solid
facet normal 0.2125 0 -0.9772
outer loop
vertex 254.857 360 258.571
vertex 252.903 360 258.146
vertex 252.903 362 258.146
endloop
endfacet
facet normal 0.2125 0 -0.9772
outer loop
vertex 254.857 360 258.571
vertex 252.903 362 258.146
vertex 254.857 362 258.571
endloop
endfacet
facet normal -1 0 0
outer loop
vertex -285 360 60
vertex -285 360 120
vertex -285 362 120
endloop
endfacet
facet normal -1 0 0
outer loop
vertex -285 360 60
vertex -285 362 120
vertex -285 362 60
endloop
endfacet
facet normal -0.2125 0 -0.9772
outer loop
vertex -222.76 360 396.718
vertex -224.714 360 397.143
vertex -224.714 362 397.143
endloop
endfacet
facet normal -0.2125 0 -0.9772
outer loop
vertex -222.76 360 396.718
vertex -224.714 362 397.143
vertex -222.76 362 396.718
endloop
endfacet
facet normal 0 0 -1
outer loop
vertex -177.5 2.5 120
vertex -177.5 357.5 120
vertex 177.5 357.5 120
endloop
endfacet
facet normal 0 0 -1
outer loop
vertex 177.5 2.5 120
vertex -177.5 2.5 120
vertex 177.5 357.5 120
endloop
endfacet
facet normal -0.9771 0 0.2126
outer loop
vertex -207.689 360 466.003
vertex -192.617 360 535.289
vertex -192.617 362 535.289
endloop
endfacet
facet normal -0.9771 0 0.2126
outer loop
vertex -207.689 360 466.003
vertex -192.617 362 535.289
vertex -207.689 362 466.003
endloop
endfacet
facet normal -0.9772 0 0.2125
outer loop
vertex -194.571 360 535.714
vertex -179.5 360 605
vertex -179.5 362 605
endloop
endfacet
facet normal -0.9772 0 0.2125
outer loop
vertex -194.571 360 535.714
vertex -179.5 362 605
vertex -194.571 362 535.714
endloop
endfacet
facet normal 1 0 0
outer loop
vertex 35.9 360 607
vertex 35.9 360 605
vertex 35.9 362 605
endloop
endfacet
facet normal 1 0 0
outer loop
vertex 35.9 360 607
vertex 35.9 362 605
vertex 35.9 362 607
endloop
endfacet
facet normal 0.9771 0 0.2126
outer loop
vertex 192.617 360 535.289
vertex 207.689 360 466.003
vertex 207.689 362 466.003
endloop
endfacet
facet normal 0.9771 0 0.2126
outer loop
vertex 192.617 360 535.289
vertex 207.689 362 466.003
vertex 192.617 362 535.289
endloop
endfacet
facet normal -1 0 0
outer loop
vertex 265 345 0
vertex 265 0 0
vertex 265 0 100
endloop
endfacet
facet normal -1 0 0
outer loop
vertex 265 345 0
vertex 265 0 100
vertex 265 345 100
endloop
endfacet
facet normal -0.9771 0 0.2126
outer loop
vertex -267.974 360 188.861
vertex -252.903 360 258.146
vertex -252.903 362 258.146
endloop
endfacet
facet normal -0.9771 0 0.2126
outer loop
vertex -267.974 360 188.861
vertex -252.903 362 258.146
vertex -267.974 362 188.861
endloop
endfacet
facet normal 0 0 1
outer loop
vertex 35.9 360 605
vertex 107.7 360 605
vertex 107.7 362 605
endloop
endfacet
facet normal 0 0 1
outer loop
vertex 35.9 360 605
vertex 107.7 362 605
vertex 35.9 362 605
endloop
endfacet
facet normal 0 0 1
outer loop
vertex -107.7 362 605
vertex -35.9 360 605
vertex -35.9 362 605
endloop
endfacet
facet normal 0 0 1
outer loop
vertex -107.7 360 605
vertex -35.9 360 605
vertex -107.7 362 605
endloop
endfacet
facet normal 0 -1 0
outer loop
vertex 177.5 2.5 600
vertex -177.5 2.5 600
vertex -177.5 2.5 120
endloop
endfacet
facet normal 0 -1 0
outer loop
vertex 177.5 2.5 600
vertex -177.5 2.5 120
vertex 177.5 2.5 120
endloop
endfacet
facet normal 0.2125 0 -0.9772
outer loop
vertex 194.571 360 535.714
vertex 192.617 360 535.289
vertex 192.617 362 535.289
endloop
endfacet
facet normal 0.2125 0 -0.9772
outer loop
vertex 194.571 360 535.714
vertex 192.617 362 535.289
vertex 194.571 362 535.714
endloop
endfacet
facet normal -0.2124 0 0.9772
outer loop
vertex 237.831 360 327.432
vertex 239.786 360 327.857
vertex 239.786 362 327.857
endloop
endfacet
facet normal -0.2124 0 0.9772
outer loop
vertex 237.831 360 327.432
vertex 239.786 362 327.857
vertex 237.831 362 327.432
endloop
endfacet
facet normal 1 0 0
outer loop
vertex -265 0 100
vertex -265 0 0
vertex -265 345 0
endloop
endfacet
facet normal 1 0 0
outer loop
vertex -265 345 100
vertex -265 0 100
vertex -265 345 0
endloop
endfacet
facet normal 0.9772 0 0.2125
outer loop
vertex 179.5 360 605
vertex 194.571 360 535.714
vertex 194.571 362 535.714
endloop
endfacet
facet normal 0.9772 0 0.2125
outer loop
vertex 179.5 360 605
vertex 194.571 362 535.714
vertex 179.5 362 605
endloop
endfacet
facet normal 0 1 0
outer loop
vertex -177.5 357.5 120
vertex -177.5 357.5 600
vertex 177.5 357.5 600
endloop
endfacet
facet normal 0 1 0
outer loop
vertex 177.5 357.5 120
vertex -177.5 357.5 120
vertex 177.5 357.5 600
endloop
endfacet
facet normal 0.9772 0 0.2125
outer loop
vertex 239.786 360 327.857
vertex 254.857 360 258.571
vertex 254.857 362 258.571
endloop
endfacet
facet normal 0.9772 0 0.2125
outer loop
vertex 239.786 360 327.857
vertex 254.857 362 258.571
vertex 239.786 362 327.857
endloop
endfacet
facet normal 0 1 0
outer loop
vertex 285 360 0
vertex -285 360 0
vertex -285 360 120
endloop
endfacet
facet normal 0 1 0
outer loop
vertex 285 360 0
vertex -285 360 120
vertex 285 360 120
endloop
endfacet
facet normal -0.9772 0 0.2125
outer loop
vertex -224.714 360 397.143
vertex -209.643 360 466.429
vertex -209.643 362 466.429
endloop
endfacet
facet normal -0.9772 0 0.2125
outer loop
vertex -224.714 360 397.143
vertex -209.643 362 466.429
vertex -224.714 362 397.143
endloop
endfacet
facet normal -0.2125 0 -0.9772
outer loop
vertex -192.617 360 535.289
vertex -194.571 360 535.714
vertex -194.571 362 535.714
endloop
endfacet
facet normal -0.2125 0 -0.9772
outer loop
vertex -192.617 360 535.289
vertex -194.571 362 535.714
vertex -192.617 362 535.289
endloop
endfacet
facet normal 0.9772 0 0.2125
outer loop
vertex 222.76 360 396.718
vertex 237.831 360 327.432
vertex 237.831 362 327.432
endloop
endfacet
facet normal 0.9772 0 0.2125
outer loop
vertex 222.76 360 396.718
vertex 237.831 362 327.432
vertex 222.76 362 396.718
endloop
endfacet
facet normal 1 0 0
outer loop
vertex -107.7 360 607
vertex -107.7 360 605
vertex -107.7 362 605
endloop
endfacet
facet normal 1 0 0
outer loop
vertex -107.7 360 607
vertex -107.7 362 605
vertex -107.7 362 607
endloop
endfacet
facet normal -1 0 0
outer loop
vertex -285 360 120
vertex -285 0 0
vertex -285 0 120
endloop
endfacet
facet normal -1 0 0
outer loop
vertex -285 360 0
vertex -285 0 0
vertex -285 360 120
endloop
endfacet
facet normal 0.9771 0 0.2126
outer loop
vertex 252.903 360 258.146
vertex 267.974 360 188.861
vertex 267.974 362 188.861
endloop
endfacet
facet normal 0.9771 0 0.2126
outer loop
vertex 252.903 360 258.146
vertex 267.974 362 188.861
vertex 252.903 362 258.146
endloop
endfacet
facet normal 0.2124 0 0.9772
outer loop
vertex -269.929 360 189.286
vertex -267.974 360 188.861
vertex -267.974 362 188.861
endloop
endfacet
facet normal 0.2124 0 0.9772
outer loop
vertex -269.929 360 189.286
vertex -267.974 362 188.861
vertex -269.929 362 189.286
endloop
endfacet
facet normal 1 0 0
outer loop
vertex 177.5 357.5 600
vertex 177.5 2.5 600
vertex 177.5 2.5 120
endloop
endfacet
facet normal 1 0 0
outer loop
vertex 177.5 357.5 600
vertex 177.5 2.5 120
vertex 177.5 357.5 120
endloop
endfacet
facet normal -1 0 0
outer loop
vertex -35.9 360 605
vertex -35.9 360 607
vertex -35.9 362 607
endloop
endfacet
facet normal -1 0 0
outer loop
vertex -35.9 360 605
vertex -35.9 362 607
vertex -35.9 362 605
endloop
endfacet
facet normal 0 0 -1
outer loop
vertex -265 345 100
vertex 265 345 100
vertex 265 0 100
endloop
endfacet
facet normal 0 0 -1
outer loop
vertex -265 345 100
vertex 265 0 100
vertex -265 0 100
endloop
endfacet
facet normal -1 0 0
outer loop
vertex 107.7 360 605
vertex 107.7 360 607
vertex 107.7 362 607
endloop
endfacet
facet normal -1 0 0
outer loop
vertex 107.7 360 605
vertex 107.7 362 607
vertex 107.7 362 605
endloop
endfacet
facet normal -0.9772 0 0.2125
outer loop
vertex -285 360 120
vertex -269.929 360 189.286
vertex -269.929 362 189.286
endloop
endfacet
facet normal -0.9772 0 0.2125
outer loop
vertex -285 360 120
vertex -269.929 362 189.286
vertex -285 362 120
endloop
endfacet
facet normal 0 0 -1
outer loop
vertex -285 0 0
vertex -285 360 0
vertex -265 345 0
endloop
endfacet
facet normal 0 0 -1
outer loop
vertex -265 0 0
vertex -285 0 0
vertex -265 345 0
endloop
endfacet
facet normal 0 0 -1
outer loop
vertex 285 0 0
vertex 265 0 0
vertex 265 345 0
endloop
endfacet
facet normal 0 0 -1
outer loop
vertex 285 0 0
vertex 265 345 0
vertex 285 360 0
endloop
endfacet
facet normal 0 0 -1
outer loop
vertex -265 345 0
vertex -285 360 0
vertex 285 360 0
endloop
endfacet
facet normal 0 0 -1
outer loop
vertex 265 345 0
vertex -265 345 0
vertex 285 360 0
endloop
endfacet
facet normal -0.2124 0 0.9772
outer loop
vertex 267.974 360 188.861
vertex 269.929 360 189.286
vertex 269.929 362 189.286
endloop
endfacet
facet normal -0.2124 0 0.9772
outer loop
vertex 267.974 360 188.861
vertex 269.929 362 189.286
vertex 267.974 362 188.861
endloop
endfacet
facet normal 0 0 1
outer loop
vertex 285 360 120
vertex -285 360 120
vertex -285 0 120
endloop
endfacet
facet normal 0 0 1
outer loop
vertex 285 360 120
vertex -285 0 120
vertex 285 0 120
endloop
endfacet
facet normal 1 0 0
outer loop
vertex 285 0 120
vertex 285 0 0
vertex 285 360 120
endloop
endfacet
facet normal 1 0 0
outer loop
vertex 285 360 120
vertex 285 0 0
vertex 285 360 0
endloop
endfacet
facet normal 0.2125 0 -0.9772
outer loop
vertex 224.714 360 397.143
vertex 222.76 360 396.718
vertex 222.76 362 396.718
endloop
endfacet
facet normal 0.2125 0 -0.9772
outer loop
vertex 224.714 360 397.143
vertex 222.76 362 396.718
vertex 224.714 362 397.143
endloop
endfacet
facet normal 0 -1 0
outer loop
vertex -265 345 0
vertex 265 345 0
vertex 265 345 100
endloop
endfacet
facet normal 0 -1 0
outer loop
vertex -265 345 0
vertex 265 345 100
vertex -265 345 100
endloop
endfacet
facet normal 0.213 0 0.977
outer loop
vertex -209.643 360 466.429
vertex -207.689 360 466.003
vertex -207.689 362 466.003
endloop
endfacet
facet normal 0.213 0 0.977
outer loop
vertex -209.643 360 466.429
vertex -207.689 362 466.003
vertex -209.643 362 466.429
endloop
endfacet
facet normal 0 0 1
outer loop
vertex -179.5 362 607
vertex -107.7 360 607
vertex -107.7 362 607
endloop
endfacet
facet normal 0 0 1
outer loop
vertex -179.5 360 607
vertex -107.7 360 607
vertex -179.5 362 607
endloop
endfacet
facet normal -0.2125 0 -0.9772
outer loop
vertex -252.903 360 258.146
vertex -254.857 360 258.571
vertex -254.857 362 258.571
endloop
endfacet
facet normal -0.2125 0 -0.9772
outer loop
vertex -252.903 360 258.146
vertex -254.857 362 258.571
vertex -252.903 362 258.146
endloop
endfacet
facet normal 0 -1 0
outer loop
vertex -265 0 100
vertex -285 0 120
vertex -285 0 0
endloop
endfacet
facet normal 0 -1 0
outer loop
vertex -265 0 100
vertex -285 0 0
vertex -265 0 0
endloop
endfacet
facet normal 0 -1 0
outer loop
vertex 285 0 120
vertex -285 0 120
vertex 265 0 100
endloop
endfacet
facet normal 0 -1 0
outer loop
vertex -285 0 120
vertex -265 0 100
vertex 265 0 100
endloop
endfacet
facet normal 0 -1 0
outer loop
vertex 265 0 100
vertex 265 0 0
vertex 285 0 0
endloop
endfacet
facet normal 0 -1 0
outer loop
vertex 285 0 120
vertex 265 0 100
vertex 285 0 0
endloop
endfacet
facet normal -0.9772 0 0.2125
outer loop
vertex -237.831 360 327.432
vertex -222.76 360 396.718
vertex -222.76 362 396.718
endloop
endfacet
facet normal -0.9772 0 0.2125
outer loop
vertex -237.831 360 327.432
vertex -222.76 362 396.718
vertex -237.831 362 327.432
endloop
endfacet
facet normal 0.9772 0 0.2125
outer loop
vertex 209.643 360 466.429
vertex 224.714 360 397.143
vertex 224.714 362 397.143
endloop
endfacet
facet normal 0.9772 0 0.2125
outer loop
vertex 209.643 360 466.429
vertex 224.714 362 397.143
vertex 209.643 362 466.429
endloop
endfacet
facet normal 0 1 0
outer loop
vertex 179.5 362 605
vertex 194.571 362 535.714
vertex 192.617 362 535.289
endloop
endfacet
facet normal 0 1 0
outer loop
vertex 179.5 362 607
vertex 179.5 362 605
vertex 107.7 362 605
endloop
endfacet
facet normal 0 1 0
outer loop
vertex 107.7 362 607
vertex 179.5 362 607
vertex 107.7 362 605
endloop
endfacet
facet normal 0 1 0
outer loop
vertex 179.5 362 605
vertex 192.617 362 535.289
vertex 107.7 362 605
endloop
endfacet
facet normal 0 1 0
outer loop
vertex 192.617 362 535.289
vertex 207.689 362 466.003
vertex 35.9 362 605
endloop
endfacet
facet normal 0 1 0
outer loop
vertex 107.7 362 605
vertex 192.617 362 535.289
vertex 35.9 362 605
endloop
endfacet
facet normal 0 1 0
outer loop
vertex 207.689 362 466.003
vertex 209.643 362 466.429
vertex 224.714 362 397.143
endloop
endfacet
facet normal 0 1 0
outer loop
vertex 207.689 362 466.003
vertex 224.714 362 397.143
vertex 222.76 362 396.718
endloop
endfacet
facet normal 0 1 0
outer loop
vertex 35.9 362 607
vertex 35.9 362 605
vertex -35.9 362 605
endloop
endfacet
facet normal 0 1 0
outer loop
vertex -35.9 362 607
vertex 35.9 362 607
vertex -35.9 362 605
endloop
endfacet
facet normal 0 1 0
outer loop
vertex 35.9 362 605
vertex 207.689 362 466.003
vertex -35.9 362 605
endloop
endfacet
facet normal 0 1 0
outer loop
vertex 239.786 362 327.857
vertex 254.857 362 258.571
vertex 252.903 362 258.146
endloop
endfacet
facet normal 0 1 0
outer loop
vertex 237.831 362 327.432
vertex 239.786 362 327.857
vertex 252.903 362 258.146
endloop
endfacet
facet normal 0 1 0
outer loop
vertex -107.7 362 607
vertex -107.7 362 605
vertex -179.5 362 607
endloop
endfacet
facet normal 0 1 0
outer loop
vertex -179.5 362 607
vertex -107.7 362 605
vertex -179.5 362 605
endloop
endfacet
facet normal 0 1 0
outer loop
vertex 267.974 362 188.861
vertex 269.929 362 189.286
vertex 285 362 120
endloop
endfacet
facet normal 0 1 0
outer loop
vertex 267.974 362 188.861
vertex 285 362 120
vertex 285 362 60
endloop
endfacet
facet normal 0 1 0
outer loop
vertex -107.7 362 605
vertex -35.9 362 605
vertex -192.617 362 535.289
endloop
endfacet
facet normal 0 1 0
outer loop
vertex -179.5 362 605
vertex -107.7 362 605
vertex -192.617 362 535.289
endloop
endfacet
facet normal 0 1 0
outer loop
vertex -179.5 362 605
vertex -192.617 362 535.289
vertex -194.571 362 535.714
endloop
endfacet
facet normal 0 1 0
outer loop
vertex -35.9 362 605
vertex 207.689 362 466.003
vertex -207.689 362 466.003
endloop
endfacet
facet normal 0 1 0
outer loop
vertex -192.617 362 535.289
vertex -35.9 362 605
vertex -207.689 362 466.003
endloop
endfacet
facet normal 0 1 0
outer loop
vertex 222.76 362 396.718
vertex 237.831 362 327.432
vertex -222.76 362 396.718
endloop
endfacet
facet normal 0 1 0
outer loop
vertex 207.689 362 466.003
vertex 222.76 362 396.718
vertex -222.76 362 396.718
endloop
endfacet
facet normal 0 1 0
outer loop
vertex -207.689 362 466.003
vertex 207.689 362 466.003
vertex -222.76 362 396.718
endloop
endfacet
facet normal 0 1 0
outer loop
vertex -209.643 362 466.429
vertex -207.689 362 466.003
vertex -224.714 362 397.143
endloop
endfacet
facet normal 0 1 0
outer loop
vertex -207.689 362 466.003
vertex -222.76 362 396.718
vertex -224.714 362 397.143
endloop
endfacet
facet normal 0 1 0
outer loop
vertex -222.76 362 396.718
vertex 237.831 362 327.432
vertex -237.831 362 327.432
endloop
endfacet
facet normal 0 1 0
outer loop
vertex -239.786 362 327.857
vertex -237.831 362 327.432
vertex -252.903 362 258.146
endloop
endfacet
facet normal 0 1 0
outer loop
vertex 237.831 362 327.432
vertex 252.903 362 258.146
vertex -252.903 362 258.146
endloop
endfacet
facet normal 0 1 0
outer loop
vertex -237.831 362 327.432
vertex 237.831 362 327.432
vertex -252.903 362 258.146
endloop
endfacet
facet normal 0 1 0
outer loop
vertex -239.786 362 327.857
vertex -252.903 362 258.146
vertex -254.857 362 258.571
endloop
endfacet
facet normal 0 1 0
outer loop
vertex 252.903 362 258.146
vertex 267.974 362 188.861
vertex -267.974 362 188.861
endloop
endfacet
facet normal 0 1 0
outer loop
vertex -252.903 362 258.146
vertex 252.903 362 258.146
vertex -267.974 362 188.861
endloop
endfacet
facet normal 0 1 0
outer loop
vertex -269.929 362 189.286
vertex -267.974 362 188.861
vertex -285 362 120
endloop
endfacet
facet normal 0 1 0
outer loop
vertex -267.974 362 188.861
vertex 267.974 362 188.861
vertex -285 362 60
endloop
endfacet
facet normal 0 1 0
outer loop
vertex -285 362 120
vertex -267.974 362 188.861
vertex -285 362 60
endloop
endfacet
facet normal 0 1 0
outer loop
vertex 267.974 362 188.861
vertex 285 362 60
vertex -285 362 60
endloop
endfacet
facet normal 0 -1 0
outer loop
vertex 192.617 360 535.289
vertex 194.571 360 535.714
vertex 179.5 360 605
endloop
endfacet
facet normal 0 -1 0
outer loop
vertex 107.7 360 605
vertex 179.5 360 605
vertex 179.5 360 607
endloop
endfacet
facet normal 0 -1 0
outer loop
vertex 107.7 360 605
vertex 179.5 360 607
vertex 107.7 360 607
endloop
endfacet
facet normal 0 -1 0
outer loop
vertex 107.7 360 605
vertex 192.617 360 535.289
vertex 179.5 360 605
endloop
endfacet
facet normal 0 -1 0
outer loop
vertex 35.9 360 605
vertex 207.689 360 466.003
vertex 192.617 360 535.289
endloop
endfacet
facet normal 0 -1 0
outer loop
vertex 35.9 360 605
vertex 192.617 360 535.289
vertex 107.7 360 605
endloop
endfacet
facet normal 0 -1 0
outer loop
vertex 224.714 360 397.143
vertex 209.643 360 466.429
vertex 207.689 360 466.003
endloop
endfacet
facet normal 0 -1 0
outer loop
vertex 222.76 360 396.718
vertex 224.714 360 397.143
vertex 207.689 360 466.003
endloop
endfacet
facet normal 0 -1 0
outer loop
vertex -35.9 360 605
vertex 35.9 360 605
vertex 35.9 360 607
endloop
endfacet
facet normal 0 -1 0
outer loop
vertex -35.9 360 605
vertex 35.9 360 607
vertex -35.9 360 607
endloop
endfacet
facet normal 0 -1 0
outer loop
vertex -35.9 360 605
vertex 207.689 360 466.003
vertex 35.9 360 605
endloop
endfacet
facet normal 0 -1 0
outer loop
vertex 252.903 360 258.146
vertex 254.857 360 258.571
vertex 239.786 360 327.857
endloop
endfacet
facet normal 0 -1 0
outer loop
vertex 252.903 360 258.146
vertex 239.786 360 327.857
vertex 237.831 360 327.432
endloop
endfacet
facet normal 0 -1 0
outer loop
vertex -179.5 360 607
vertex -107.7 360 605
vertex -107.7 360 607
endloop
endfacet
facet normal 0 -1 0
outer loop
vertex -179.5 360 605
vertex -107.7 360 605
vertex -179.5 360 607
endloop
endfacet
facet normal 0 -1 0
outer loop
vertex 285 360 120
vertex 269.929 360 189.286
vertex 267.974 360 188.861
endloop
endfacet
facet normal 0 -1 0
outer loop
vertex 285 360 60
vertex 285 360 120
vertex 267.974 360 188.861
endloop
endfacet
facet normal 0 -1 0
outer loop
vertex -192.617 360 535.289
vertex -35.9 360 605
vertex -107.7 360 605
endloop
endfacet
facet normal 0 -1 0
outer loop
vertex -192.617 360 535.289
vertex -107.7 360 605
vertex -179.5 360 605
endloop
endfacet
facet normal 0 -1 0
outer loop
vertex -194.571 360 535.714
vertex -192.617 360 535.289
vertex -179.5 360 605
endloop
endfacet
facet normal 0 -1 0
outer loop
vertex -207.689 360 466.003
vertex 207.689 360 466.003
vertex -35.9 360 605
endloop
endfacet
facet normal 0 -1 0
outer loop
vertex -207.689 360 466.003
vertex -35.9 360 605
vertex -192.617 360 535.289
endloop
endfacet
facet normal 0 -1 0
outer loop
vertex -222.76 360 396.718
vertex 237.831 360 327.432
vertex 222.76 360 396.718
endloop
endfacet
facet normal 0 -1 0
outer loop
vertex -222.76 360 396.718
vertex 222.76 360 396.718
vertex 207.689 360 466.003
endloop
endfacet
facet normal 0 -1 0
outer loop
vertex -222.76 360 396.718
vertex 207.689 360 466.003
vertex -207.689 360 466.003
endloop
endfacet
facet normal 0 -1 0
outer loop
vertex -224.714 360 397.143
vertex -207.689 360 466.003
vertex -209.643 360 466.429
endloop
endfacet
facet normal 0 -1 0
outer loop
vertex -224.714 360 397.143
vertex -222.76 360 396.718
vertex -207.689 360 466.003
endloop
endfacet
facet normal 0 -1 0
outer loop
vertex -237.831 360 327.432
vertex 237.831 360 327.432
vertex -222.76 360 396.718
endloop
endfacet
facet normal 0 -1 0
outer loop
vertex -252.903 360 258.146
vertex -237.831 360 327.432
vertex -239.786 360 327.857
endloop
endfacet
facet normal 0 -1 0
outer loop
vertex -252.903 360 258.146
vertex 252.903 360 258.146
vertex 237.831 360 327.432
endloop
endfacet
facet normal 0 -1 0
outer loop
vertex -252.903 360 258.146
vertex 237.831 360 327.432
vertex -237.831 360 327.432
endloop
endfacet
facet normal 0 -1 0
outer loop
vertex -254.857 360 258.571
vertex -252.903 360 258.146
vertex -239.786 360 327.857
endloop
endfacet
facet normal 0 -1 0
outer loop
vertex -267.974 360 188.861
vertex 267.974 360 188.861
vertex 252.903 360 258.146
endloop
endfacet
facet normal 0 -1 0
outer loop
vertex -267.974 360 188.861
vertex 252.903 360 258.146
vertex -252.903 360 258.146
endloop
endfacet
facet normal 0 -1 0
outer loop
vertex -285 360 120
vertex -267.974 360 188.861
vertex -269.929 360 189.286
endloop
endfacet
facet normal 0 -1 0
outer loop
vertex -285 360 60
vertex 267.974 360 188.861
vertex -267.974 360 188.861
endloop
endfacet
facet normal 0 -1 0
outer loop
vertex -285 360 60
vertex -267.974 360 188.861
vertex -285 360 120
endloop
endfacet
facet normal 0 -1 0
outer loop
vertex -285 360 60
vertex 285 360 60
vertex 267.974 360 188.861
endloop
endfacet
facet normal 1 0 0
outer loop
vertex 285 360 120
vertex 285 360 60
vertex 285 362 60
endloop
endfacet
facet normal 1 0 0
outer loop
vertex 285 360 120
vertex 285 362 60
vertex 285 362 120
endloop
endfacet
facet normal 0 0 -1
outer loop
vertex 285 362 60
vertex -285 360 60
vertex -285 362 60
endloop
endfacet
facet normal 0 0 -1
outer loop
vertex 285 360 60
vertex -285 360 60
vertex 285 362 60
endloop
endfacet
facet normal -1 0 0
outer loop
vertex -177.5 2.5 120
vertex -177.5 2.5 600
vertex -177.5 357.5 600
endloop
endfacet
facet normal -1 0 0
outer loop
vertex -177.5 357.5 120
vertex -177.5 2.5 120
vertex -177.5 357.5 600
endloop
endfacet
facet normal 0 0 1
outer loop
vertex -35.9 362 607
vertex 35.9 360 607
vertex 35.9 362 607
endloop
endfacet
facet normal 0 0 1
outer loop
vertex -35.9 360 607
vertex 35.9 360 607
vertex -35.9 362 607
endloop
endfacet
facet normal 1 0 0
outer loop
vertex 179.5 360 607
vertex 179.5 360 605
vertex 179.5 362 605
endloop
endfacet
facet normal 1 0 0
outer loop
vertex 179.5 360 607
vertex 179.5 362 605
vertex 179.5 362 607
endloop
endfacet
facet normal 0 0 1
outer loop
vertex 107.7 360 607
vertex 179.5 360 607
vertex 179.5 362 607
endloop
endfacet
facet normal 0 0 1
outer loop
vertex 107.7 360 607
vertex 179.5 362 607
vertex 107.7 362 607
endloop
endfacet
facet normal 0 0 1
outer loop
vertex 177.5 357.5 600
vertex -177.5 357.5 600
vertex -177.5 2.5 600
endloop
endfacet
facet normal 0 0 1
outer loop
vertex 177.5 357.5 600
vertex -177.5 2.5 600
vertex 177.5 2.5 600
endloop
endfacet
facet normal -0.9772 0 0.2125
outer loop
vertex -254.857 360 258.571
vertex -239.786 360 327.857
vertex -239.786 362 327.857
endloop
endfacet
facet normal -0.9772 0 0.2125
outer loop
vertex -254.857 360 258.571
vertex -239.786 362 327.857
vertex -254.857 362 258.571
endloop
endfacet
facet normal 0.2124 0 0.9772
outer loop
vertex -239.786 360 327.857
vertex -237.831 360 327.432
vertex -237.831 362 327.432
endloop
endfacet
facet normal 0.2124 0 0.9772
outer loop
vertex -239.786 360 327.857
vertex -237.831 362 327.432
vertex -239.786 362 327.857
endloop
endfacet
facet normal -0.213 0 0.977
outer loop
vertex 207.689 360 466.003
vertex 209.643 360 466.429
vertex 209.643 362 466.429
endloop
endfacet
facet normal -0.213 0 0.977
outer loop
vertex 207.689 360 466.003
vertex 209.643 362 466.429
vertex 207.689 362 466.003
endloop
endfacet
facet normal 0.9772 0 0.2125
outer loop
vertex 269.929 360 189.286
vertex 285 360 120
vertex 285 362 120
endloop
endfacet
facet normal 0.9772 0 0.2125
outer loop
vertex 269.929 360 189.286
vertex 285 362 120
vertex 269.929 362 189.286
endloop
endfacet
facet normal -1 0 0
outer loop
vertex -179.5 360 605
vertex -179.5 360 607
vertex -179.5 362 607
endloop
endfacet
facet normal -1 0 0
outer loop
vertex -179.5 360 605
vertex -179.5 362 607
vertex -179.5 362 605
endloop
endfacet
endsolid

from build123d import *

# Parameters (mm, degrees)
SKETCH_1_W          = 570
SKETCH_1_H          = 360
EXTRUDE_1_DEPTH     = 120
SKETCH_2_W          = 530
SKETCH_2_H          = 345
CUT_EXTRUDE_1_DEPTH = 100
SKETCH_4_W          = 355
SKETCH_4_H          = 355
EXTRUDE_2_DEPTH     = 480
EXTRUDE_3_DEPTH     = 2


with BuildPart() as part:
    # ｽｹｯﾁ1 → ﾎﾞｽ - 押し出し1 (new body)
    with BuildSketch(Plane.XY):
        with Locations((0, 180)):
            Rectangle(SKETCH_1_W, SKETCH_1_H)
    extrude(amount=EXTRUDE_1_DEPTH)

    # ｽｹｯﾁ2 → ｶｯﾄ - 押し出し1 (cut)
    with BuildSketch(Plane(origin=(0, 0, 0), x_dir=(-1, 0, 0), z_dir=(0, 0, -1))):
        with Locations((0, 172.5)):
            Rectangle(SKETCH_2_W, SKETCH_2_H)
    extrude(amount=-CUT_EXTRUDE_1_DEPTH, mode=Mode.SUBTRACT)


with BuildPart() as body_2:
    # ｽｹｯﾁ4 → ﾎﾞｽ - 押し出し2 (new body)
    with BuildSketch(Plane.XY.offset(120)):
        with Locations((0, 180)):
            Rectangle(SKETCH_4_W, SKETCH_4_H)
    extrude(amount=EXTRUDE_2_DEPTH)


with BuildPart() as body_3:
    # ｽｹｯﾁ6 → ﾎﾞｽ - 押し出し3 (new body)
    with BuildSketch(Plane(origin=(0, 360, 0), x_dir=(1, 0, 0), z_dir=(0, 1, 0))):
        Polygon((-285, -60), (285, -60), (285, -120), (269.928571429, -189.285714286), (267.974273268, -188.860604067), (252.902844696, -258.146318353), (254.857142857, -258.571428571), (239.785714286, -327.857142857), (237.831416125, -327.432032639), (222.759987553, -396.717746924), (224.714285714, -397.142857143), (209.642857143, -466.428571429), (207.688558982, -466.00346121), (192.61713041, -535.289175496), (194.571428571, -535.714285714), (179.5, -605), (179.5, -607), (107.7, -607), (107.7, -605), (35.9, -605), (35.9, -607), (-35.9, -607), (-35.9, -605), (-107.7, -605), (-107.7, -607), (-179.5, -607), (-179.5, -605), (-194.571428571, -535.714285714), (-192.61713041, -535.289175496), (-207.688558982, -466.00346121), (-209.642857143, -466.428571429), (-224.714285714, -397.142857143), (-222.759987553, -396.717746924), (-237.831416125, -327.432032639), (-239.785714286, -327.857142857), (-254.857142857, -258.571428571), (-252.902844696, -258.146318353), (-267.974273268, -188.860604067), (-269.928571429, -189.285714286), (-285, -120), align=None)
    extrude(amount=EXTRUDE_3_DEPTH)


solid = Compound([part.part, body_2.part, body_3.part])
